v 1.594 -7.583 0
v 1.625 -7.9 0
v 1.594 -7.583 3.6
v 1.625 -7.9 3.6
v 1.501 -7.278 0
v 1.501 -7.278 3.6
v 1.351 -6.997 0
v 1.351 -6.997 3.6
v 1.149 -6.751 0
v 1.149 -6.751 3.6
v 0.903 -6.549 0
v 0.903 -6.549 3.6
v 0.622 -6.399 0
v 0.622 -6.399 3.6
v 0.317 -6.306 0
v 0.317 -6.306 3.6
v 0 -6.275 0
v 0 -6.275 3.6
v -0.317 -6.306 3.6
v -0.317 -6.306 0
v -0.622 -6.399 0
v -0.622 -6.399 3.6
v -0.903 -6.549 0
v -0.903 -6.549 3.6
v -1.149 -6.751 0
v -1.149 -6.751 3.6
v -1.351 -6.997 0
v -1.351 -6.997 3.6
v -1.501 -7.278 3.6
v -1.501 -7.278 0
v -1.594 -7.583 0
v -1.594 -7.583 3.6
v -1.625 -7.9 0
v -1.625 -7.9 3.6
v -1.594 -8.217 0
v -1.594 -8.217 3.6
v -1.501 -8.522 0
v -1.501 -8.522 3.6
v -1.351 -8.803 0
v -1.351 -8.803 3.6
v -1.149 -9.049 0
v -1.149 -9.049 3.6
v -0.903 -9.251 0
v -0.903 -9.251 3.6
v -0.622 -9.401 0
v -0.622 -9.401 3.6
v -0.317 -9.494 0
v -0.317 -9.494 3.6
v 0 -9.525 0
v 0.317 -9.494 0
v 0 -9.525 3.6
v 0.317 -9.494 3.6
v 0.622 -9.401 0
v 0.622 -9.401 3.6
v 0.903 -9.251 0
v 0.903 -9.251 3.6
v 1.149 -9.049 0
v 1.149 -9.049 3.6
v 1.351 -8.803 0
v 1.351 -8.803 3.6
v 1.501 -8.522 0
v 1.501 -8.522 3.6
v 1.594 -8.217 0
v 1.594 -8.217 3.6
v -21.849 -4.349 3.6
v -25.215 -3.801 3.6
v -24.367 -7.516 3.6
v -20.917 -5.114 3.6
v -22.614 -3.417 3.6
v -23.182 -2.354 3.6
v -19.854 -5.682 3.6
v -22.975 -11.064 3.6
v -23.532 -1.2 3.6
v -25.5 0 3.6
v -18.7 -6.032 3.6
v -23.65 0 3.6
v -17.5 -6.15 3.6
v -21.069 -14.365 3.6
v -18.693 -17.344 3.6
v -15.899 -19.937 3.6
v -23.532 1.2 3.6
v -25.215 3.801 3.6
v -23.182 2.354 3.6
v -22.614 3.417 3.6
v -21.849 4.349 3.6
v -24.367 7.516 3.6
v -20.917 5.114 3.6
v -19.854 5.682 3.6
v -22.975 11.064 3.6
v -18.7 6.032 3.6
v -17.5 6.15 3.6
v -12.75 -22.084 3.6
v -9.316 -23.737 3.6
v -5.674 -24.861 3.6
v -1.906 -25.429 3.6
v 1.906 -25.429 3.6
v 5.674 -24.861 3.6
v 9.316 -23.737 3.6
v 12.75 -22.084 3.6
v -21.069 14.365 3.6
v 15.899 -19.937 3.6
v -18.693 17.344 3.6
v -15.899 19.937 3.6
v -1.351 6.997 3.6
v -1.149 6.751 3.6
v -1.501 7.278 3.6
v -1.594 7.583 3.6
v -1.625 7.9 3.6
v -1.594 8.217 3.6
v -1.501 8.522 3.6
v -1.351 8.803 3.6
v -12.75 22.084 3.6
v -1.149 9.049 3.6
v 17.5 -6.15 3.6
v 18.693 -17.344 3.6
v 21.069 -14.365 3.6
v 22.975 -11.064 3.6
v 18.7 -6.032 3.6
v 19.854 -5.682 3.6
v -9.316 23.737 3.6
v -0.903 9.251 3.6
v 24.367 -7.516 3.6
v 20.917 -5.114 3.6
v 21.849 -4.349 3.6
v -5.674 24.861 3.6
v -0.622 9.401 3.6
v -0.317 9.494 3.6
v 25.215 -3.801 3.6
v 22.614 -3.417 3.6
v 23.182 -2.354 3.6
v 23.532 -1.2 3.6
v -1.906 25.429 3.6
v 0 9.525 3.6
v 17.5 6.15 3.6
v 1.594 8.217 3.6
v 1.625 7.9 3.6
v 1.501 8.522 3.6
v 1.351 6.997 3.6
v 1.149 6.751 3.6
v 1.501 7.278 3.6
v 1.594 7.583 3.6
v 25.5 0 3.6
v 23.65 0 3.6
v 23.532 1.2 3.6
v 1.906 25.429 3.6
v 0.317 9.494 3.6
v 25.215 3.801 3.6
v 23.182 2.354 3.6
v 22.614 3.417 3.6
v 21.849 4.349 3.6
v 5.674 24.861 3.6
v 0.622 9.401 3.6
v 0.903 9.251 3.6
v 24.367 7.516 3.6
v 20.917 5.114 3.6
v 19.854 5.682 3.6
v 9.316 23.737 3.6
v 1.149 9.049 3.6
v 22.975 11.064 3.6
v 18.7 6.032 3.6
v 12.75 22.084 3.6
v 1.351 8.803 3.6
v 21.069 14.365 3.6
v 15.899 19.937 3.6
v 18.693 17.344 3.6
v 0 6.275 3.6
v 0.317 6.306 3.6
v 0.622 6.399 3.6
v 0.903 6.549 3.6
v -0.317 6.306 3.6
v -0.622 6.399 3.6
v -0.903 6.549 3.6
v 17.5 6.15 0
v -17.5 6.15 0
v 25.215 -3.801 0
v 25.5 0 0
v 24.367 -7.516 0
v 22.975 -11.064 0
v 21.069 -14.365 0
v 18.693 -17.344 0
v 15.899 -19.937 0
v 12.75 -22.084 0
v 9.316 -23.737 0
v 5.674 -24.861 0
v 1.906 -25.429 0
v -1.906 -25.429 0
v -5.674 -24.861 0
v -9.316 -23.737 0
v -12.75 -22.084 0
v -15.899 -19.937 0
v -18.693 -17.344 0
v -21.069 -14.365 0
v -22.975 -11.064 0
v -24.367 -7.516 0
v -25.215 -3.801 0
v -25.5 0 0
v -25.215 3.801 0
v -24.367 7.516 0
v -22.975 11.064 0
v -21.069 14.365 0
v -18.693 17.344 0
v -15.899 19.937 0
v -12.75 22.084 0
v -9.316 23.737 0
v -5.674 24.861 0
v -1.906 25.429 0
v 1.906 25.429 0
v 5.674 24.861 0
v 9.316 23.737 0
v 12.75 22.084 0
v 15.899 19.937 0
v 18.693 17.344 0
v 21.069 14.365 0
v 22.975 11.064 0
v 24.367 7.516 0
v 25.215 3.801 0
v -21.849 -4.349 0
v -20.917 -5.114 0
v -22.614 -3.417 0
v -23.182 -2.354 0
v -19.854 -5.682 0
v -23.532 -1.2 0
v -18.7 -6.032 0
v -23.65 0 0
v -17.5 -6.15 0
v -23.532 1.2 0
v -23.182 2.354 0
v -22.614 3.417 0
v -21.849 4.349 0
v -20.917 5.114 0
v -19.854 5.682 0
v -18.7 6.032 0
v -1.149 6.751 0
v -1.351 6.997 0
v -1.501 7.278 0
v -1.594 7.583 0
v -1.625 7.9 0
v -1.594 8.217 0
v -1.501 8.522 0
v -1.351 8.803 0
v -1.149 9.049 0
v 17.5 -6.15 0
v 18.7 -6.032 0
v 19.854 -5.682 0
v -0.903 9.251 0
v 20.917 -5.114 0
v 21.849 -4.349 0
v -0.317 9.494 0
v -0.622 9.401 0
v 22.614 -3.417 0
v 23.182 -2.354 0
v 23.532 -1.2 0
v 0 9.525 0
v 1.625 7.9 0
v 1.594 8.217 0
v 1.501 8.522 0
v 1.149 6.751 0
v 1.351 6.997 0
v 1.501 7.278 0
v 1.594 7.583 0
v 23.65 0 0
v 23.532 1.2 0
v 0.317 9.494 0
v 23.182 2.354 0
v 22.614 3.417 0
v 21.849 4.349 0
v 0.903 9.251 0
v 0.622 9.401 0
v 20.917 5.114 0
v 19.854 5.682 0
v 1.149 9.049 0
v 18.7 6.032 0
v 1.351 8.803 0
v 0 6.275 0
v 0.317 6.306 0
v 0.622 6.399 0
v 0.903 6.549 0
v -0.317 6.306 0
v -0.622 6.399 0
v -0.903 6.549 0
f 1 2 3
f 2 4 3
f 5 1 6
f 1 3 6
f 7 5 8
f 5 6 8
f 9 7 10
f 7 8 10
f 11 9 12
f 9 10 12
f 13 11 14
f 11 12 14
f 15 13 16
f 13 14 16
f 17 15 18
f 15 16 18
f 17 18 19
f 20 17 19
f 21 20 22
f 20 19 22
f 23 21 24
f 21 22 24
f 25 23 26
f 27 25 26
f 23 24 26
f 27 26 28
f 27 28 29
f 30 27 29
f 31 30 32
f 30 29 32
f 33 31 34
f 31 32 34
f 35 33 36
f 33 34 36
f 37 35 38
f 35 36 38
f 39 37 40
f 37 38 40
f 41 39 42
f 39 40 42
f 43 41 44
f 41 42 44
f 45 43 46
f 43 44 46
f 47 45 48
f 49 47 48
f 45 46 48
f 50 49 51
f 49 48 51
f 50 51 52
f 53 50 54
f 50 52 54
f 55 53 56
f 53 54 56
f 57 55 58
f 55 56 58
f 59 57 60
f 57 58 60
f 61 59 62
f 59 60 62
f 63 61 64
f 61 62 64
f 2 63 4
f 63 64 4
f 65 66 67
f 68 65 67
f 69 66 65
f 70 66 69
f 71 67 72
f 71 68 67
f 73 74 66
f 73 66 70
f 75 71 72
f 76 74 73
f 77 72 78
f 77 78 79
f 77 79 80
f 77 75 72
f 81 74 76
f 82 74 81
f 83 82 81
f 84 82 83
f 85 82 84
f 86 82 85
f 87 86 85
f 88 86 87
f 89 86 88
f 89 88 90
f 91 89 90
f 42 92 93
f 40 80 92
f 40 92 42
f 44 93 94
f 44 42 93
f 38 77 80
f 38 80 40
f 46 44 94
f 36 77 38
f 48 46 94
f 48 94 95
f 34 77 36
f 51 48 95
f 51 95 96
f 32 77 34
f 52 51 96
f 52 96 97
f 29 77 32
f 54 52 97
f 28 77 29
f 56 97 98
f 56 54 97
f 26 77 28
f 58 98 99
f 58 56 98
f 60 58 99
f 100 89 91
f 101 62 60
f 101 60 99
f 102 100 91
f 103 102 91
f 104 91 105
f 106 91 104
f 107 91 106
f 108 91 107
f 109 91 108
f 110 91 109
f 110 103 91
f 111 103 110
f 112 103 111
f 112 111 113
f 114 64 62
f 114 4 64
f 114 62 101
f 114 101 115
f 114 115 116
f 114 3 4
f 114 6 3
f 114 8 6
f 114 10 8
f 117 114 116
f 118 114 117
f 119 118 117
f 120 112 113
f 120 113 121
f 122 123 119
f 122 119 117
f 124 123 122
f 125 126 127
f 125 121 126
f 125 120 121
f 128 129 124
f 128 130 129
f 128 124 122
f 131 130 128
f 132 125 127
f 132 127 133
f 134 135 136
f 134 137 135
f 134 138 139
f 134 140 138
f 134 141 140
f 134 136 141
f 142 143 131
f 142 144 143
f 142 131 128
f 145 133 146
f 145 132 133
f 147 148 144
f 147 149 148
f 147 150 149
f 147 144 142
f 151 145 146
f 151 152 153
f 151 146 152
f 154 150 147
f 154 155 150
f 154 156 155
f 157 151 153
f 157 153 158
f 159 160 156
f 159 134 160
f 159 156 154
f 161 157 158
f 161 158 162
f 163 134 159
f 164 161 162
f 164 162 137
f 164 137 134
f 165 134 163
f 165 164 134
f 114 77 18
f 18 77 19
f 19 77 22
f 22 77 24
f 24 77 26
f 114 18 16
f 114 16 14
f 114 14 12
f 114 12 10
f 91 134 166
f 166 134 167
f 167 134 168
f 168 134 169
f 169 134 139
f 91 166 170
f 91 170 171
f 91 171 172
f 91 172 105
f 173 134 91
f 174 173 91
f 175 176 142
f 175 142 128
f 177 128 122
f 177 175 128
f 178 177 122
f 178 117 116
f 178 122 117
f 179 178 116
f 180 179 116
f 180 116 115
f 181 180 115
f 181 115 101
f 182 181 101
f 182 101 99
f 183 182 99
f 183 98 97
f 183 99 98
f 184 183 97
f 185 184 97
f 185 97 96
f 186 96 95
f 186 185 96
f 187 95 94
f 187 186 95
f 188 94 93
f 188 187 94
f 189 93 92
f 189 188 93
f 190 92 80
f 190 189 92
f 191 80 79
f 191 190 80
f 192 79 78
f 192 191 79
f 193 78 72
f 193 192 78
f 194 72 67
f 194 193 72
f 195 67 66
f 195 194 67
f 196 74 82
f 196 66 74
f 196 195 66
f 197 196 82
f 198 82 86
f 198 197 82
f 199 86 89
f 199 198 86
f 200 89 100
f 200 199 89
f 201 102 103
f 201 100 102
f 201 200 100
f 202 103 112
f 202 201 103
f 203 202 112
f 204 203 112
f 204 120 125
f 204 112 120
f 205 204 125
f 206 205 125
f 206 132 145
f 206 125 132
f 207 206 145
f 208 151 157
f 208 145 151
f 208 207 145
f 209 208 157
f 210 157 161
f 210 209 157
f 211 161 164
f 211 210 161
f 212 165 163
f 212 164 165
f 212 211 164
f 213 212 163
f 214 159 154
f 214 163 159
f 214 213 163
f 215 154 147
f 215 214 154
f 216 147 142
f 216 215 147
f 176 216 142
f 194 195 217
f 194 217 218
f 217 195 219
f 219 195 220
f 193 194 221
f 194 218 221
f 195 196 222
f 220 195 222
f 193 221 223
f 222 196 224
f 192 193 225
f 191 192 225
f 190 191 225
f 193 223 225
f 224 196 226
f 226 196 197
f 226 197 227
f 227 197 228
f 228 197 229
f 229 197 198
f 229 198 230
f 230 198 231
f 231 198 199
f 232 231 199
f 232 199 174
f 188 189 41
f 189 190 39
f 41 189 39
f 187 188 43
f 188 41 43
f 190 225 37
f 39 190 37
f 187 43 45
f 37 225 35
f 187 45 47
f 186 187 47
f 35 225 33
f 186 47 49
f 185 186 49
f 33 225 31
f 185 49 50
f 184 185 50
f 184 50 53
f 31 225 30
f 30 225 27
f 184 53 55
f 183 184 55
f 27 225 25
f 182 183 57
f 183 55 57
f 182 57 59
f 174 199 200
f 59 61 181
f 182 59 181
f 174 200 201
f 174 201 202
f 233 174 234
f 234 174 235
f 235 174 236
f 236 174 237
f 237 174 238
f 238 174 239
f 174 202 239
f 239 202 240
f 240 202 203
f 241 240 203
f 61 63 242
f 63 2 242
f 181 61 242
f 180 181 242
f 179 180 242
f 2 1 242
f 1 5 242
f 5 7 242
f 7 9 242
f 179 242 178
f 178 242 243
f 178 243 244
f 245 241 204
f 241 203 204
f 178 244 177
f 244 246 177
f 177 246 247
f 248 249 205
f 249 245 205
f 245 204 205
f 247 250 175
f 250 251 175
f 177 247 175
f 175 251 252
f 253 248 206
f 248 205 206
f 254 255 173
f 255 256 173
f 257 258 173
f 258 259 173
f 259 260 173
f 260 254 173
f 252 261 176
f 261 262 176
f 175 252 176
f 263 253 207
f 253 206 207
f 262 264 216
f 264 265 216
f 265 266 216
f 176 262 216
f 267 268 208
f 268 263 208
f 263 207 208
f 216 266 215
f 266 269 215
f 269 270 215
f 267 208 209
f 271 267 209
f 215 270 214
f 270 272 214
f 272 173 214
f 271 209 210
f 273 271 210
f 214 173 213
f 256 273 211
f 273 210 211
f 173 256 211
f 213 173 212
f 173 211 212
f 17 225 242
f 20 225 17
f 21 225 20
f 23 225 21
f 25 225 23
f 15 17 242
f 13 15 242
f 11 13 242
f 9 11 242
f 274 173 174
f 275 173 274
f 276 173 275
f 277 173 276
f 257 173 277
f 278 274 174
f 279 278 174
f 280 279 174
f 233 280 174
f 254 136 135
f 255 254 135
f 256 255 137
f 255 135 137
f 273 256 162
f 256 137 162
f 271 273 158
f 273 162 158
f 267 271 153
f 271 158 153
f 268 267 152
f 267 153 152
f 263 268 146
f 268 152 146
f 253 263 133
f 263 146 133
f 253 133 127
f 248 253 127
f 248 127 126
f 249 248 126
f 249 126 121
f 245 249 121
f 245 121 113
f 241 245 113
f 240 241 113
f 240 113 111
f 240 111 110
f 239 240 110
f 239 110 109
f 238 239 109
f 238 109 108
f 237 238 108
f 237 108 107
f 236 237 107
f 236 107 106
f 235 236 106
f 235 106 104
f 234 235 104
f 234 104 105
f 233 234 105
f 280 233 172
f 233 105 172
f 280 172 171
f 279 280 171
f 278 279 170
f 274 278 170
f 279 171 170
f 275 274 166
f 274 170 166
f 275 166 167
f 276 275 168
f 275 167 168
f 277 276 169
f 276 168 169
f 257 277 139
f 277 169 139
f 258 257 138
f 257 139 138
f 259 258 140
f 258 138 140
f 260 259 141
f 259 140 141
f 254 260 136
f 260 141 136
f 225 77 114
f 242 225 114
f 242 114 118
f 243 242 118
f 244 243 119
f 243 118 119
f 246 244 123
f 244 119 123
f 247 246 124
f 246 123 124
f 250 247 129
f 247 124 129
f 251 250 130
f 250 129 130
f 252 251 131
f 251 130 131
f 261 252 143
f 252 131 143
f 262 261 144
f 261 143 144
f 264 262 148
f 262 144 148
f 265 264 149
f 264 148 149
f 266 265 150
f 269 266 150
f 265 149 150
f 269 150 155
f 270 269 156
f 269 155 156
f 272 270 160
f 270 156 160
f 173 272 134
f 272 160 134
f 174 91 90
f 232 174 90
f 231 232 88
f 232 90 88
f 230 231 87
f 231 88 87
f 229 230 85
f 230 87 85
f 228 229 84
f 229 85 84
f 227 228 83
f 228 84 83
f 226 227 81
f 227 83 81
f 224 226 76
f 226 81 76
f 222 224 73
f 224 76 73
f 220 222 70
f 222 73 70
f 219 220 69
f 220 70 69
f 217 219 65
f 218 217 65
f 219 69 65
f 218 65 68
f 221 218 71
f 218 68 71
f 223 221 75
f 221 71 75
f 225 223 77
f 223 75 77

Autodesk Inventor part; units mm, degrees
ref_plane "YZ Plane" through (0, 0, 0) normal (1, 0, 0) x (0, 1, 0)
ref_plane "XZ Plane" through (0, 0, 0) normal (0, 1, 0) x (-1, 0, 0)
ref_plane "XY Plane" through (0, 0, 0) normal (0, 0, 1) x (1, 0, 0)
sketch "Sketch1" plane through (0, 0, 0) normal (0, 0, 1) x (1, 0, 0)
  circle A0 centre (0, 0) radius 25.5
  dimension "d0" = 51
extrude "Extrusion1" add sketch "Sketch1" along normal blind 3.6
sketch "Sketch2" plane through (0, 0, 3.6) normal (0, 0, 1) x (1, 0, 0)
  line L0 (17.5, 0) -> (-17.5, 0) construction
  line L1 (17.5, 6.15) -> (-17.5, 6.15)
  line L2 (-17.5, -6.15) -> (17.5, -6.15)
  arc A0 (17.5, -6.15) -> (17.5, 6.15) centre (17.5, 0) ccw
  arc A1 (-17.5, 6.15) -> (-17.5, -6.15) centre (-17.5, 0) ccw
  point P0 (0, 0)
  dimension "d3" = 17.5
  dimension "d4" = 12.3
extrude "Extrusion2" cut sketch "Sketch2" against normal blind 3.6
sketch "Sketch3" plane through (0, 0, 3.6) normal (0, 0, 1) x (1, 0, 0)
  line L0 (-2.6, 9.8) -> (2.6, 9.8)
  line L1 (2.6, 9.8) -> (2.6, 6)
  line L2 (2.6, 6) -> (-2.6, 6)
  line L3 (-2.6, 6) -> (-2.6, 9.8)
  line L4 (-2.6, 9.8) -> (2.6, 6) construction
  line L5 (2.6, 9.8) -> (-2.6, 6) construction
  line L6 (-35.7, 0) -> (35.7, 0) projected
  line L7 (-35.7, 0) -> (35.7, 0) projected
  line L8 (-2.6, -9.8) -> (2.6, -9.8)
  line L9 (2.6, -9.8) -> (2.6, -6)
  line L10 (2.6, -6) -> (-2.6, -6)
  line L11 (-2.6, -6) -> (-2.6, -9.8)
  line L12 (-2.6, -9.8) -> (2.6, -6) construction
  line L13 (2.6, -9.8) -> (-2.6, -6) construction
  circle A0 centre (0, -7.9) radius 1.625
  circle A1 centre (0, 7.9) radius 1.625
  point P0 (0, 0)
  dimension "d7" = 5.2
  dimension "d8" = 3.8
  dimension "d9" = 6
  dimension "d10" = 6
  dimension "d13" = 0
  dimension "d14" = 3.25
  dimension "d15" = 3.25
extrude "Extrusion3" cut sketch "Sketch3" against normal blind 10 contours A0 | A1
properties part number "1"
